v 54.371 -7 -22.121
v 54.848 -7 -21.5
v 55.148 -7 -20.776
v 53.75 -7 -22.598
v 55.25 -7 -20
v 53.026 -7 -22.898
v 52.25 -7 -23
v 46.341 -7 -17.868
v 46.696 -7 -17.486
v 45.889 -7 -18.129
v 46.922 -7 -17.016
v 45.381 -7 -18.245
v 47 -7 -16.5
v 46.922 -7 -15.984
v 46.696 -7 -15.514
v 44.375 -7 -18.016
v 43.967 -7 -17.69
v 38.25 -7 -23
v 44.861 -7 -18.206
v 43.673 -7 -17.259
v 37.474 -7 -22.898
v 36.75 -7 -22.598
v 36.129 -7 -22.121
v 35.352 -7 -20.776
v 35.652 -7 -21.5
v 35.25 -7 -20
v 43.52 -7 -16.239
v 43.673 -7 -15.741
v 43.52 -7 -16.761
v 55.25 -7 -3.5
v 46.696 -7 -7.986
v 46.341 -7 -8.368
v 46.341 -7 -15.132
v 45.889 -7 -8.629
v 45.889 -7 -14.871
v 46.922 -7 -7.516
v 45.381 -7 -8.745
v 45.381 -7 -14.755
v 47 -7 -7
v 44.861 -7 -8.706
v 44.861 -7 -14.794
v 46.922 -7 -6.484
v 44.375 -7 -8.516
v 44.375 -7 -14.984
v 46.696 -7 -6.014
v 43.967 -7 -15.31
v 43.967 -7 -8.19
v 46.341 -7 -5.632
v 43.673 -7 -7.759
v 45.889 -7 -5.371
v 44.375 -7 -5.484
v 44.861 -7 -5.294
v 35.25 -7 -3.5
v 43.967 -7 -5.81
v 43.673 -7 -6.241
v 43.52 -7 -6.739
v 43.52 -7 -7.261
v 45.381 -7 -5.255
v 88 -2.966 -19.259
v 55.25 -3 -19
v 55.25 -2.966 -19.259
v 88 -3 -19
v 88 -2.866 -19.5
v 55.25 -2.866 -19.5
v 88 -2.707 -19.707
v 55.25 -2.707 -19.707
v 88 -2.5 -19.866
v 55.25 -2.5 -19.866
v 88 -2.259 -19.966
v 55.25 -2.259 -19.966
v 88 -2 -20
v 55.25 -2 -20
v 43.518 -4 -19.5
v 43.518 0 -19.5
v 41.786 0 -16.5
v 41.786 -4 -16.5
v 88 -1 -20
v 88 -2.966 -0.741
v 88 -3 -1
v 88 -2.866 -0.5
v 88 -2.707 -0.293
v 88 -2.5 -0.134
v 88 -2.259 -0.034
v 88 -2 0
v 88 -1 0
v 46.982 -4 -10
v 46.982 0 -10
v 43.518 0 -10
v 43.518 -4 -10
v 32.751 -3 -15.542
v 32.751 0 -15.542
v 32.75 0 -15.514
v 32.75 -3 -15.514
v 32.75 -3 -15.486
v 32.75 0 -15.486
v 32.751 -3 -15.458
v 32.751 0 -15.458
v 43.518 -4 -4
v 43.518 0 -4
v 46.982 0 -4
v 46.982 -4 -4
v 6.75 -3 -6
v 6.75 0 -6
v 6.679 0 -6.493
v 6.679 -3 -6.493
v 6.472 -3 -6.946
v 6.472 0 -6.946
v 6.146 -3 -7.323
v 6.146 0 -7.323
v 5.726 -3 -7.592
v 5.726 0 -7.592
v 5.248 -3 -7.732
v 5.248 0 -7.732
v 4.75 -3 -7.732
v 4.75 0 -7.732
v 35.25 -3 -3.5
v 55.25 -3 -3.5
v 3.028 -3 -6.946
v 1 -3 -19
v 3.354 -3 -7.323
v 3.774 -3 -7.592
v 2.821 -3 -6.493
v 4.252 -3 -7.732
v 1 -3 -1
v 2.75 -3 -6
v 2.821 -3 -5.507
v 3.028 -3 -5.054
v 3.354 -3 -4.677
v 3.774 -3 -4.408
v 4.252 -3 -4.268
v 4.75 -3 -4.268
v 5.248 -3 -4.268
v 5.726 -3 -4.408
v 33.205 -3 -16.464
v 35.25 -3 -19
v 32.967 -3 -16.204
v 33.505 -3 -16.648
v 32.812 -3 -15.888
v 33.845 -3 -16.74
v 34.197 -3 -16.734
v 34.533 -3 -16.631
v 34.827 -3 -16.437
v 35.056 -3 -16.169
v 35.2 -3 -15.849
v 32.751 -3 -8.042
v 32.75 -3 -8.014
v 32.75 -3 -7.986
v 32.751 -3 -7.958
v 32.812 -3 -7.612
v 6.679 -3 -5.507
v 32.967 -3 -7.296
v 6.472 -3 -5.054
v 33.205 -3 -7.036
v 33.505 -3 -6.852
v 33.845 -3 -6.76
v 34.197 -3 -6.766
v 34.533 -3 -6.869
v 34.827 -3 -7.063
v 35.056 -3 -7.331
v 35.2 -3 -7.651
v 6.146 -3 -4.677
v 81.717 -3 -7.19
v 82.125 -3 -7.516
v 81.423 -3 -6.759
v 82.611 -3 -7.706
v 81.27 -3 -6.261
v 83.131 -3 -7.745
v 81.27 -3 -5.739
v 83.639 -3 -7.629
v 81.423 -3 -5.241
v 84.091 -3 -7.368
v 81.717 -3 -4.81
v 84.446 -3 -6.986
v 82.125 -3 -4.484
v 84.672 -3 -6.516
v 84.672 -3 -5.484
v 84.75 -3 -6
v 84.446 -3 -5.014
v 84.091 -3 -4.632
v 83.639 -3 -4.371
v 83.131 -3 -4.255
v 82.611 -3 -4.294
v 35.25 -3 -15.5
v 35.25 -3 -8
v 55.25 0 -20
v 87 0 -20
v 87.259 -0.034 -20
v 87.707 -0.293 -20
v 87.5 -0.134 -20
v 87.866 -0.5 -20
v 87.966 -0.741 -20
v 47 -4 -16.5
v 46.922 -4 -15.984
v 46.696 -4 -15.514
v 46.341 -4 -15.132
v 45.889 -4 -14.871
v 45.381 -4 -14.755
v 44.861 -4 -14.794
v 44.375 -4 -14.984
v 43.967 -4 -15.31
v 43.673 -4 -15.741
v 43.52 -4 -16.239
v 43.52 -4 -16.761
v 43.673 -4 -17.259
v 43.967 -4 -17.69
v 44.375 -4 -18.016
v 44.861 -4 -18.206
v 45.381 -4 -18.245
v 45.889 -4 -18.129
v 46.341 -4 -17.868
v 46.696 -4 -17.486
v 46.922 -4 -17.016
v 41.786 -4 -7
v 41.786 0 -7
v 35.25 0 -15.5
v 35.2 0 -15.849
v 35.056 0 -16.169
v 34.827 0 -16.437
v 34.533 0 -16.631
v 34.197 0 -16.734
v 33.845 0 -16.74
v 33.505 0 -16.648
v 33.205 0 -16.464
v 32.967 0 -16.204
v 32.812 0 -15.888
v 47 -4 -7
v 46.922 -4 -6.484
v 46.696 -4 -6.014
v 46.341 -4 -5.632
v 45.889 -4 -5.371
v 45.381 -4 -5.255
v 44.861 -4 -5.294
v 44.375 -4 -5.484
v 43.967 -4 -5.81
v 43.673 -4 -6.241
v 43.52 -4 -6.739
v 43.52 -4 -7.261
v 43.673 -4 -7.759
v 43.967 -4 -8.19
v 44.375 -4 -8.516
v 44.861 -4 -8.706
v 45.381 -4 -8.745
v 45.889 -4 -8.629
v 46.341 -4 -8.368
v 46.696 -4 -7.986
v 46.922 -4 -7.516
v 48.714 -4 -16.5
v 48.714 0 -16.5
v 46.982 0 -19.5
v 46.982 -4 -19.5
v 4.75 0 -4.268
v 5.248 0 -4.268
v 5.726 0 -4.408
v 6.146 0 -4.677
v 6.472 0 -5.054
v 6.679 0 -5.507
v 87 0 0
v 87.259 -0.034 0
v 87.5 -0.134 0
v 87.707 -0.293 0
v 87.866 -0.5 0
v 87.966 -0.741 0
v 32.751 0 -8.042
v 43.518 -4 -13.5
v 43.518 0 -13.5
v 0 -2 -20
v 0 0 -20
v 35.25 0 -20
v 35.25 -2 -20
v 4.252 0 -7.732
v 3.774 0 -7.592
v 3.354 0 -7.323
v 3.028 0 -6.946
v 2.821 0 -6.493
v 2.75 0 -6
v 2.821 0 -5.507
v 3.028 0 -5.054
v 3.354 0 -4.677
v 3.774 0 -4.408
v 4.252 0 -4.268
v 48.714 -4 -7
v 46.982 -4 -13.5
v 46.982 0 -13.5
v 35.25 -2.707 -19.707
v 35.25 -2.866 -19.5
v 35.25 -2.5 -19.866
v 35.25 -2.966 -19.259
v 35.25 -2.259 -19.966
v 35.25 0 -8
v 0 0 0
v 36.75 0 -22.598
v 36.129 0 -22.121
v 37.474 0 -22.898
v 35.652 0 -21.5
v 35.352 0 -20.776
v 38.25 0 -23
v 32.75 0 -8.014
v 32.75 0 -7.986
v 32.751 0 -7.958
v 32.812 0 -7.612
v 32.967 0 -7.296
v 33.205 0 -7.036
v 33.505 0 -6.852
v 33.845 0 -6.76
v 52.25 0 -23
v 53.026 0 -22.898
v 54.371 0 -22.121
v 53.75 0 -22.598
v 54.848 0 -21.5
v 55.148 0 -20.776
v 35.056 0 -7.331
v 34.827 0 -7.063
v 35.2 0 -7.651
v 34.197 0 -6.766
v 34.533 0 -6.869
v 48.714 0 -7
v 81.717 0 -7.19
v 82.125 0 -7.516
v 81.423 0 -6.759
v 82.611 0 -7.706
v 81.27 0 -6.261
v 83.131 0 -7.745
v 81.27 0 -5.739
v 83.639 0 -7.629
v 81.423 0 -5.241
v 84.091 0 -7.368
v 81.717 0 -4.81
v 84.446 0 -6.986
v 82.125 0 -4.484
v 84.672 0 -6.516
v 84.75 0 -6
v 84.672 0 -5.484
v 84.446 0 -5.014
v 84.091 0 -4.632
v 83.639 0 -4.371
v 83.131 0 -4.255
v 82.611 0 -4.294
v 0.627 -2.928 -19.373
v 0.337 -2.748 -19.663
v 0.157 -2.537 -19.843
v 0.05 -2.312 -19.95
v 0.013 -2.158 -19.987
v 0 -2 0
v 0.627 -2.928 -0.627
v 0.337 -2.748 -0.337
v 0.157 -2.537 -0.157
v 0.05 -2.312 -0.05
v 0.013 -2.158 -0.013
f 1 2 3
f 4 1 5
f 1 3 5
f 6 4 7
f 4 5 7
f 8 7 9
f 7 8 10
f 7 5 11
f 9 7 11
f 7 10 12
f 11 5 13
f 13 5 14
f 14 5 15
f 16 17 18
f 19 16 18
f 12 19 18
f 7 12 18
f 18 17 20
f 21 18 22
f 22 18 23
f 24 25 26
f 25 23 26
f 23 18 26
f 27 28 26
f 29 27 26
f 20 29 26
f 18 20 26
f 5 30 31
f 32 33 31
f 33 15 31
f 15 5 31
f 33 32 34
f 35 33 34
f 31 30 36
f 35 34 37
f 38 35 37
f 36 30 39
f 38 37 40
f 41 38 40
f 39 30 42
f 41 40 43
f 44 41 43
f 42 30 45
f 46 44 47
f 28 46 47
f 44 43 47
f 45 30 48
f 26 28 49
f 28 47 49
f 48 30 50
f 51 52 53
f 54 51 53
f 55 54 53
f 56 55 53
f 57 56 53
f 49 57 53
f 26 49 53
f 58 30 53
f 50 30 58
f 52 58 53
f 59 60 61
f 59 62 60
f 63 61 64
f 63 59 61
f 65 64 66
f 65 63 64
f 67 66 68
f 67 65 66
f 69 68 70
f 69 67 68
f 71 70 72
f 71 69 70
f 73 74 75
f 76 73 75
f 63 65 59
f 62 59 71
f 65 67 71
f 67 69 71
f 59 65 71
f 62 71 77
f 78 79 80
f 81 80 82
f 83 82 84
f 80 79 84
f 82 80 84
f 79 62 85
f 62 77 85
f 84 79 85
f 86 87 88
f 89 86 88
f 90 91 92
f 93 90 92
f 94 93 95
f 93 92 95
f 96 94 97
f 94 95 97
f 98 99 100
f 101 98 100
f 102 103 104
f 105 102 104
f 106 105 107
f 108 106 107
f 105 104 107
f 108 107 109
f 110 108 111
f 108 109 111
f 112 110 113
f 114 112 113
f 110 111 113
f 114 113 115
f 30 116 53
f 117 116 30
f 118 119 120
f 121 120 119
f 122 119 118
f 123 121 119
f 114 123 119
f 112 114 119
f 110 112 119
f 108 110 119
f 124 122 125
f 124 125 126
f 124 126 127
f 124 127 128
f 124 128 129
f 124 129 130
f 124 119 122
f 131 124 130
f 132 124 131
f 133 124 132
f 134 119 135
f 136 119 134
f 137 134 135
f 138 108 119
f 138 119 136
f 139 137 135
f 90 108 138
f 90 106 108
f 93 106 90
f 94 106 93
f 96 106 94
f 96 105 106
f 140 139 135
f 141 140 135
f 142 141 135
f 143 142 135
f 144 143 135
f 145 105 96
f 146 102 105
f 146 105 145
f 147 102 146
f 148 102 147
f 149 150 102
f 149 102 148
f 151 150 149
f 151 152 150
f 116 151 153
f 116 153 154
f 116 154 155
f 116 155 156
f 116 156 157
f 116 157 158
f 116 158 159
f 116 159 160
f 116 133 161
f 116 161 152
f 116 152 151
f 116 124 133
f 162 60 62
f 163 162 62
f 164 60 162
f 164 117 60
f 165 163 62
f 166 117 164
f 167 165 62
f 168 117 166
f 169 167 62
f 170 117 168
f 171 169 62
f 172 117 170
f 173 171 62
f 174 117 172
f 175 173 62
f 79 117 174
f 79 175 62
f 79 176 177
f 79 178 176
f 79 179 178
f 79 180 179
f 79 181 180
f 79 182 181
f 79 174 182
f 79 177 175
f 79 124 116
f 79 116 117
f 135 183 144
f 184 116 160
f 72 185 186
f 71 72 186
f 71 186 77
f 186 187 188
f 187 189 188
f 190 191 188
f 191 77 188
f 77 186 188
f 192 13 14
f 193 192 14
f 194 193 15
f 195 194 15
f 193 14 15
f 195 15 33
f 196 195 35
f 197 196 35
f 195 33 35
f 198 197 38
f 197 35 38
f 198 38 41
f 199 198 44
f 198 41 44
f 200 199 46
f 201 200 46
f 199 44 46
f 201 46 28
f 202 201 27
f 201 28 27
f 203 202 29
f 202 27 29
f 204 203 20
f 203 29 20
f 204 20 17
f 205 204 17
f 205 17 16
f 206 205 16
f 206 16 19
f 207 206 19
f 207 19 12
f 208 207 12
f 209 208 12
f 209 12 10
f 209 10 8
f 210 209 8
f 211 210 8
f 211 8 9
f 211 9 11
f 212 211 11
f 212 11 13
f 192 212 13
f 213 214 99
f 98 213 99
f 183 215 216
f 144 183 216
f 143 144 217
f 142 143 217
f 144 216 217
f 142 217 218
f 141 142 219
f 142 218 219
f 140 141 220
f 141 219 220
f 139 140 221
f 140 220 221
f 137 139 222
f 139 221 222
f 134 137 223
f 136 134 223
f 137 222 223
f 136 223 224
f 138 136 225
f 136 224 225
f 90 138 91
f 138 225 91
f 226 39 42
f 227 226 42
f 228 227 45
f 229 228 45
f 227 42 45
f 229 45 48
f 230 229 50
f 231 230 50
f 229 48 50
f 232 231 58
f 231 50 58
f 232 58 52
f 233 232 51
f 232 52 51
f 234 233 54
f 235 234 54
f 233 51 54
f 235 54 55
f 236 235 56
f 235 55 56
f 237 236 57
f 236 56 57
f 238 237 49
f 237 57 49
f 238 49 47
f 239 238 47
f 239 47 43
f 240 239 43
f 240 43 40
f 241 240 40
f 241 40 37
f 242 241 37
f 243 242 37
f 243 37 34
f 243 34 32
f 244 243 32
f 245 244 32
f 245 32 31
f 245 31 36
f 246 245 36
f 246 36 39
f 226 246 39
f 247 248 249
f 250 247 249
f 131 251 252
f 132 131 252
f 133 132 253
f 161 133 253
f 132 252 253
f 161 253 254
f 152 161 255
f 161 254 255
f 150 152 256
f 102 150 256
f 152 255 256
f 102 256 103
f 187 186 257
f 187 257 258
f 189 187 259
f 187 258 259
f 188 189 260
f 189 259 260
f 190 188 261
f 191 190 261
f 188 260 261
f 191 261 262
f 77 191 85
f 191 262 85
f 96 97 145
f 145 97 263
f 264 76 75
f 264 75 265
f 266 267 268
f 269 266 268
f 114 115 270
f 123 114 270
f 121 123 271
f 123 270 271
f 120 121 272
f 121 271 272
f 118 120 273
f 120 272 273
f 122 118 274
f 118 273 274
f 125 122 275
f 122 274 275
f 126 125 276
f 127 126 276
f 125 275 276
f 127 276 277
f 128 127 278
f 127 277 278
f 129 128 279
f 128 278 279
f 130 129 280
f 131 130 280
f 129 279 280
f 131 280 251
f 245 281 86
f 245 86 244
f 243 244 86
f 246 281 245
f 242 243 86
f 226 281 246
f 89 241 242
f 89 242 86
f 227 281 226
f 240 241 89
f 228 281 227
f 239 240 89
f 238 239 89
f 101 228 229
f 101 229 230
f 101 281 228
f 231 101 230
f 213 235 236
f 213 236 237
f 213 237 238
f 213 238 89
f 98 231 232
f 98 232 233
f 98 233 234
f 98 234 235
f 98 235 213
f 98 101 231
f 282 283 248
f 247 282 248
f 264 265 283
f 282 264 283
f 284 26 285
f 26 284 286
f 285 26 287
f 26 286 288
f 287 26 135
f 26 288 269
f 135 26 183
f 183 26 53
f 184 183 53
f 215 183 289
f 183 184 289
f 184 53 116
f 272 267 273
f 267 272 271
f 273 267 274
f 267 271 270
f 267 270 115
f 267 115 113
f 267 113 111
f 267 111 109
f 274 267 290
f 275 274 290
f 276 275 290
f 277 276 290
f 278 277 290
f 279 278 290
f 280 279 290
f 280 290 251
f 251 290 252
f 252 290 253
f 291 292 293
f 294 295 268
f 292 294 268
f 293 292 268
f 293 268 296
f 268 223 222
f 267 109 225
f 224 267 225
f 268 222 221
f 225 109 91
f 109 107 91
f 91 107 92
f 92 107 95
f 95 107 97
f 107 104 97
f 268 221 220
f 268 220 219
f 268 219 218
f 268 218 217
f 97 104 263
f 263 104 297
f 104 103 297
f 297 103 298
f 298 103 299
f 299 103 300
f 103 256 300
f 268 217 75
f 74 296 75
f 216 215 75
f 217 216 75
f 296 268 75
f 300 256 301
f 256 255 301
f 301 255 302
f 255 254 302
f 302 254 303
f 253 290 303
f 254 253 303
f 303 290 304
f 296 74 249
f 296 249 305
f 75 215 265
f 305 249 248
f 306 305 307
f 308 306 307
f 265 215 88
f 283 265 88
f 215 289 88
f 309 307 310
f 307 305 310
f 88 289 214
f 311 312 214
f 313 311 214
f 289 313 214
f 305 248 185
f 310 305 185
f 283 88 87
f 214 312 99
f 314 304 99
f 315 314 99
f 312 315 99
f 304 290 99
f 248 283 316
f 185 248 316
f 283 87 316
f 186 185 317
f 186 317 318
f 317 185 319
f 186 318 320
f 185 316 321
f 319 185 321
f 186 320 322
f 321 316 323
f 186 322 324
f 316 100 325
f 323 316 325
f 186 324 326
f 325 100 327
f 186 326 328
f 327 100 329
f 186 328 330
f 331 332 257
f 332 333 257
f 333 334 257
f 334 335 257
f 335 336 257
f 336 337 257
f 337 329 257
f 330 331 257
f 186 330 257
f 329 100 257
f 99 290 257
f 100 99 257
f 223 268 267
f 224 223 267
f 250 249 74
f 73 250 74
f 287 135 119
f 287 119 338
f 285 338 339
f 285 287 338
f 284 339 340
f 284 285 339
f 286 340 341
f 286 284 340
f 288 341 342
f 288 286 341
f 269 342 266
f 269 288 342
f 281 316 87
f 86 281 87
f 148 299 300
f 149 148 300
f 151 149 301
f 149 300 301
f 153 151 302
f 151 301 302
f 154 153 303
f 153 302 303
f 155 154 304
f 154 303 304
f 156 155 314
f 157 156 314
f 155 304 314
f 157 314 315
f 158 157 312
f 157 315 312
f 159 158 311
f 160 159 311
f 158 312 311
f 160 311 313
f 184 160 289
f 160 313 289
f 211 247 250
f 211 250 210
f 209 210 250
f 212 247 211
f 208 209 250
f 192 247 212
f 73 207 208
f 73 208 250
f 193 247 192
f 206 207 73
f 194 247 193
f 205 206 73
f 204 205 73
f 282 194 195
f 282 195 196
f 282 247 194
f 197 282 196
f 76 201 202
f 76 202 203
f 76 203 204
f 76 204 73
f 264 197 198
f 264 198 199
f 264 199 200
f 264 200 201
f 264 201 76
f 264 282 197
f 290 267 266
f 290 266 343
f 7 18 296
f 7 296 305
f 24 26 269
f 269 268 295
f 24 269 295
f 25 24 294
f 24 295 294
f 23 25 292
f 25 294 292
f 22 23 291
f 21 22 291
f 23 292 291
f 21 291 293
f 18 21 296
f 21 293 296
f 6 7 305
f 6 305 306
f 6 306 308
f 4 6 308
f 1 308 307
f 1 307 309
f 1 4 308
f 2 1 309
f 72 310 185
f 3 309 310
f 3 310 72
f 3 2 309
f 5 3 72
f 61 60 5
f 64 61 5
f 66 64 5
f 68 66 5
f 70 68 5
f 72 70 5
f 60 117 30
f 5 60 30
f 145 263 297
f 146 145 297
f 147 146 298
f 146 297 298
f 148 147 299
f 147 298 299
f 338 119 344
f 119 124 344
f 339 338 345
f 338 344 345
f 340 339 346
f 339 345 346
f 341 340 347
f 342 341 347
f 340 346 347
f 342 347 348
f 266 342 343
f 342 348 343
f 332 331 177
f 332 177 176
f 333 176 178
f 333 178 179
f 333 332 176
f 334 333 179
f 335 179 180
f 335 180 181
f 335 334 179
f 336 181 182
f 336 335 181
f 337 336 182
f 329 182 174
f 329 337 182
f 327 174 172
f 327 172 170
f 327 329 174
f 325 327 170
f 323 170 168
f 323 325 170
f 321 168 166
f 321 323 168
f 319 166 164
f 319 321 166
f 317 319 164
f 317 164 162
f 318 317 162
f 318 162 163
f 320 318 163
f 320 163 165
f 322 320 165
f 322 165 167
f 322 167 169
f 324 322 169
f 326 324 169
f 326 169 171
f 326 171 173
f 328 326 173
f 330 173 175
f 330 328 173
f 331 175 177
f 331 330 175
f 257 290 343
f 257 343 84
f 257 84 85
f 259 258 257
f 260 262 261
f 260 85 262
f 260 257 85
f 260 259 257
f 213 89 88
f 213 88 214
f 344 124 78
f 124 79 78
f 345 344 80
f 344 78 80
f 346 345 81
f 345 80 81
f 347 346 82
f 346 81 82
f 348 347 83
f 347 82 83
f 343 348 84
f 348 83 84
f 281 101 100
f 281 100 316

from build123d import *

# Parameters (mm, degrees)
F0_W     = 88
F0_H     = 20
F0_R     = 1.75
F1_DEPTH = 3
F2_W     = 20
F2_H     = 4.5
F2_H_2   = 7.5
F3_DEPTH = 4
F6_DEPTH = 4
F4_R     = 1.75
F7_DEPTH = 25
F9_DEPTH = 3
F10_R    = 3
F11_R    = 1


# Not quite as in the source:
# - a feature names something its author has since deleted; it is built from what else it names


with BuildPart() as f1:
    # F0 (on Front) → F1 (new body)
    with BuildSketch(Plane.XZ):
        with Locations((44, -10)):
            Rectangle(F0_W, F0_H)
        with BuildLine():
            ThreePointArc((35.25, -15.5), (34.0207943633, -16.7498270258), (32.7506918489, -15.5415829716))
            ThreePointArc((32.7506918489, -15.5415829716), (32.75, -15.5), (32.7506918489, -15.4584170284))
            Line((32.7506918489, -15.4584170284), (32.7506918489, -8.0415829716))
            ThreePointArc((32.7506918489, -8.0415829716), (32.75, -8), (32.7506918489, -7.9584170284))
            ThreePointArc((32.7506918489, -7.9584170284), (34.0207943633, -6.7501729742), (35.25, -8))
            Line((35.25, -8), (35.25, -15.5))
        make_face(mode=Mode.SUBTRACT)
        with BuildLine():
            ThreePointArc((4.75, -4.2679491924), (6.1456439237, -4.6771243445), (6.75, -6))
            ThreePointArc((6.75, -6), (6.1456439237, -7.3228756555), (4.75, -7.7320508076))
            ThreePointArc((4.75, -7.7320508076), (2.75, -6), (4.75, -4.2679491924))
        make_face(mode=Mode.SUBTRACT)
        with Locations((83, -6)):
            Circle(F0_R, mode=Mode.SUBTRACT)
    extrude(amount=F1_DEPTH)

    # F2 (on face) → F3 (join)
    with BuildSketch(Plane.XZ.offset(3)):
        with Locations((45.25, -5.75)):
            Rectangle(F2_W, F2_H)
        with Locations((45.25, -11.75)):
            Rectangle(F2_W, F2_H_2)
        with Locations((45.25, -17.75)):
            Rectangle(F2_W, F2_H)
    extrude(amount=F3_DEPTH)

    # F5 (on face) → F6 (cut)
    with BuildSketch(Plane(origin=(0, 0, 0), x_dir=(-1, 0, 0), z_dir=(0, 1, 0))):
        Polygon((-43.5179491924, -4), (-46.9820508076, -4), (-48.7141016151, -7), (-46.9820508076, -10), (-43.5179491924, -10), (-41.7858983849, -7), align=None)
        Polygon((-43.5179491924, -13.5), (-46.9820508076, -13.5), (-48.7141016151, -16.5), (-46.9820508076, -19.5), (-43.5179491924, -19.5), (-41.7858983849, -16.5), align=None)
    extrude(amount=-F6_DEPTH, mode=Mode.SUBTRACT)

    # F4 (on face) → F7 (cut)
    with BuildSketch(Plane.XZ.offset(7)):
        with Locations((45.25, -7)):
            Circle(F4_R)
        with Locations((45.25, -16.5)):
            Circle(F4_R)
    extrude(amount=-F7_DEPTH, mode=Mode.SUBTRACT)

    # F8 (on face) → F9 (join)
    with BuildSketch(Plane(origin=(0, 0, -20), x_dir=(1, 0, 0), z_dir=(0, 0, -1))):
        Polygon((55.25, 3), (55.25, 7), (35.25, 7), (35.25, 3), (35.25, 0), (55.25, 0), align=None)
    extrude(amount=F9_DEPTH)

    # F10
    f10_edges = [f1.edges().sort_by_distance(p)[0] for p in [
        (35.25, -3.5, -23),
        (55.25, -3.5, -23),
    ]]
    fillet(f10_edges, radius=F10_R)

    # F11
    f11_edges = [f1.edges().sort_by_distance(p)[0] for p in [
        (44, -3, 0),
        (88, 0, -10),
        (71.625, -3, -20),
        (17.625, -3, -20),
        (0, -3, -10),
    ]]
    fillet(f11_edges, radius=F11_R)


solid = f1.part
